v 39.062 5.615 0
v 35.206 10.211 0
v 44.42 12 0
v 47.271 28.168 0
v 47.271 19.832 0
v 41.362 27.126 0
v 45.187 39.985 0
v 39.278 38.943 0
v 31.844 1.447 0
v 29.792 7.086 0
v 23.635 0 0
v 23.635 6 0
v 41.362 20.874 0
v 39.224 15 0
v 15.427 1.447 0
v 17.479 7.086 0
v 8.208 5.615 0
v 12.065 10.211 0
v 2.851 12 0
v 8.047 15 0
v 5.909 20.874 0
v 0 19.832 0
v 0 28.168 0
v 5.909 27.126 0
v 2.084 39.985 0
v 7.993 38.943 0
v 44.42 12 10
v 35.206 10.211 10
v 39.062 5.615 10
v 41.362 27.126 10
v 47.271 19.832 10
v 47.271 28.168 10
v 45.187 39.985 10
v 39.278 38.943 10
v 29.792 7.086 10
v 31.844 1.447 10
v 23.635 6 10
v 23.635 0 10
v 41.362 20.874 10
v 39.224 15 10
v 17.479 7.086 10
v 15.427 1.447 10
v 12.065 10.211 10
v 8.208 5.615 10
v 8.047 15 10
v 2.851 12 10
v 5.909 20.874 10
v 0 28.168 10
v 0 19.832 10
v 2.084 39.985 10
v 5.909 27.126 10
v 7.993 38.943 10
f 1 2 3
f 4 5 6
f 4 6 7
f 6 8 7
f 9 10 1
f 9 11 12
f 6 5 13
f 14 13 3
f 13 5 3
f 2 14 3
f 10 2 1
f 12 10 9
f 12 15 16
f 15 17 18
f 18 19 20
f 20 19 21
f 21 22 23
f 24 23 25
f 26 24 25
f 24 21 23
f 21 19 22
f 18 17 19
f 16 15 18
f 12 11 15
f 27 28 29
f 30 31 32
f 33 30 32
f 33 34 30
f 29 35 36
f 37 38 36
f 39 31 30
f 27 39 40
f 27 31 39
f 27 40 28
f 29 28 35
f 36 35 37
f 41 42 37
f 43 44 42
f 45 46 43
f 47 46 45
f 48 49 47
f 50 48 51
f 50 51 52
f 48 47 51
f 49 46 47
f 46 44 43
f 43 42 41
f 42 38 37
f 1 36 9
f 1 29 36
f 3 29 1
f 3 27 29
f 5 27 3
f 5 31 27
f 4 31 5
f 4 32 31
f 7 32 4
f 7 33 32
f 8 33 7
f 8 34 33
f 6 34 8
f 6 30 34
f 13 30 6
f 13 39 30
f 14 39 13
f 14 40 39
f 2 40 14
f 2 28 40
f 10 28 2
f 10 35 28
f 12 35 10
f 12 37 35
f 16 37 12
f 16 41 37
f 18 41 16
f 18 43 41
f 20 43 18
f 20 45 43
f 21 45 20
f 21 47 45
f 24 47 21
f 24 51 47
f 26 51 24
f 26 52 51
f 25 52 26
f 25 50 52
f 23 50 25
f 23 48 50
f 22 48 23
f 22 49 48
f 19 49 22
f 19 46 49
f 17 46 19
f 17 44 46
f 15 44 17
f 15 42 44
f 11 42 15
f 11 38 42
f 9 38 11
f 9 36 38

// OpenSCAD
$fn = 32;

// ----------------------------------------------------------------------
// Clip blank: omega clip, 10 mm thick
// ----------------------------------------------------------------------

// --- parameters (mm) ---
profile_height = 10;      // extrusion height
profile_points = 26;      // points of the closed outline

profile = [[0, 28.168], [0, 19.832], [2.851, 12], [8.208, 5.615], [15.427, 1.447], [23.635, 0], [31.844, 1.447], [39.062, 5.615], [44.42, 12], [47.271, 19.832], [47.271, 28.168], [45.187, 39.985], [39.278, 38.943], [41.362, 27.126], [41.362, 20.874], [39.224, 15], [35.206, 10.211], [29.792, 7.086], [23.635, 6], [17.479, 7.086], [12.065, 10.211], [8.047, 15], [5.909, 20.874], [5.909, 27.126], [7.993, 38.943], [2.084, 39.985]];  // single closed polygon, 26 points, counter clockwise

// --- the one profile operation ---
linear_extrude(height = profile_height) polygon(points = profile);
